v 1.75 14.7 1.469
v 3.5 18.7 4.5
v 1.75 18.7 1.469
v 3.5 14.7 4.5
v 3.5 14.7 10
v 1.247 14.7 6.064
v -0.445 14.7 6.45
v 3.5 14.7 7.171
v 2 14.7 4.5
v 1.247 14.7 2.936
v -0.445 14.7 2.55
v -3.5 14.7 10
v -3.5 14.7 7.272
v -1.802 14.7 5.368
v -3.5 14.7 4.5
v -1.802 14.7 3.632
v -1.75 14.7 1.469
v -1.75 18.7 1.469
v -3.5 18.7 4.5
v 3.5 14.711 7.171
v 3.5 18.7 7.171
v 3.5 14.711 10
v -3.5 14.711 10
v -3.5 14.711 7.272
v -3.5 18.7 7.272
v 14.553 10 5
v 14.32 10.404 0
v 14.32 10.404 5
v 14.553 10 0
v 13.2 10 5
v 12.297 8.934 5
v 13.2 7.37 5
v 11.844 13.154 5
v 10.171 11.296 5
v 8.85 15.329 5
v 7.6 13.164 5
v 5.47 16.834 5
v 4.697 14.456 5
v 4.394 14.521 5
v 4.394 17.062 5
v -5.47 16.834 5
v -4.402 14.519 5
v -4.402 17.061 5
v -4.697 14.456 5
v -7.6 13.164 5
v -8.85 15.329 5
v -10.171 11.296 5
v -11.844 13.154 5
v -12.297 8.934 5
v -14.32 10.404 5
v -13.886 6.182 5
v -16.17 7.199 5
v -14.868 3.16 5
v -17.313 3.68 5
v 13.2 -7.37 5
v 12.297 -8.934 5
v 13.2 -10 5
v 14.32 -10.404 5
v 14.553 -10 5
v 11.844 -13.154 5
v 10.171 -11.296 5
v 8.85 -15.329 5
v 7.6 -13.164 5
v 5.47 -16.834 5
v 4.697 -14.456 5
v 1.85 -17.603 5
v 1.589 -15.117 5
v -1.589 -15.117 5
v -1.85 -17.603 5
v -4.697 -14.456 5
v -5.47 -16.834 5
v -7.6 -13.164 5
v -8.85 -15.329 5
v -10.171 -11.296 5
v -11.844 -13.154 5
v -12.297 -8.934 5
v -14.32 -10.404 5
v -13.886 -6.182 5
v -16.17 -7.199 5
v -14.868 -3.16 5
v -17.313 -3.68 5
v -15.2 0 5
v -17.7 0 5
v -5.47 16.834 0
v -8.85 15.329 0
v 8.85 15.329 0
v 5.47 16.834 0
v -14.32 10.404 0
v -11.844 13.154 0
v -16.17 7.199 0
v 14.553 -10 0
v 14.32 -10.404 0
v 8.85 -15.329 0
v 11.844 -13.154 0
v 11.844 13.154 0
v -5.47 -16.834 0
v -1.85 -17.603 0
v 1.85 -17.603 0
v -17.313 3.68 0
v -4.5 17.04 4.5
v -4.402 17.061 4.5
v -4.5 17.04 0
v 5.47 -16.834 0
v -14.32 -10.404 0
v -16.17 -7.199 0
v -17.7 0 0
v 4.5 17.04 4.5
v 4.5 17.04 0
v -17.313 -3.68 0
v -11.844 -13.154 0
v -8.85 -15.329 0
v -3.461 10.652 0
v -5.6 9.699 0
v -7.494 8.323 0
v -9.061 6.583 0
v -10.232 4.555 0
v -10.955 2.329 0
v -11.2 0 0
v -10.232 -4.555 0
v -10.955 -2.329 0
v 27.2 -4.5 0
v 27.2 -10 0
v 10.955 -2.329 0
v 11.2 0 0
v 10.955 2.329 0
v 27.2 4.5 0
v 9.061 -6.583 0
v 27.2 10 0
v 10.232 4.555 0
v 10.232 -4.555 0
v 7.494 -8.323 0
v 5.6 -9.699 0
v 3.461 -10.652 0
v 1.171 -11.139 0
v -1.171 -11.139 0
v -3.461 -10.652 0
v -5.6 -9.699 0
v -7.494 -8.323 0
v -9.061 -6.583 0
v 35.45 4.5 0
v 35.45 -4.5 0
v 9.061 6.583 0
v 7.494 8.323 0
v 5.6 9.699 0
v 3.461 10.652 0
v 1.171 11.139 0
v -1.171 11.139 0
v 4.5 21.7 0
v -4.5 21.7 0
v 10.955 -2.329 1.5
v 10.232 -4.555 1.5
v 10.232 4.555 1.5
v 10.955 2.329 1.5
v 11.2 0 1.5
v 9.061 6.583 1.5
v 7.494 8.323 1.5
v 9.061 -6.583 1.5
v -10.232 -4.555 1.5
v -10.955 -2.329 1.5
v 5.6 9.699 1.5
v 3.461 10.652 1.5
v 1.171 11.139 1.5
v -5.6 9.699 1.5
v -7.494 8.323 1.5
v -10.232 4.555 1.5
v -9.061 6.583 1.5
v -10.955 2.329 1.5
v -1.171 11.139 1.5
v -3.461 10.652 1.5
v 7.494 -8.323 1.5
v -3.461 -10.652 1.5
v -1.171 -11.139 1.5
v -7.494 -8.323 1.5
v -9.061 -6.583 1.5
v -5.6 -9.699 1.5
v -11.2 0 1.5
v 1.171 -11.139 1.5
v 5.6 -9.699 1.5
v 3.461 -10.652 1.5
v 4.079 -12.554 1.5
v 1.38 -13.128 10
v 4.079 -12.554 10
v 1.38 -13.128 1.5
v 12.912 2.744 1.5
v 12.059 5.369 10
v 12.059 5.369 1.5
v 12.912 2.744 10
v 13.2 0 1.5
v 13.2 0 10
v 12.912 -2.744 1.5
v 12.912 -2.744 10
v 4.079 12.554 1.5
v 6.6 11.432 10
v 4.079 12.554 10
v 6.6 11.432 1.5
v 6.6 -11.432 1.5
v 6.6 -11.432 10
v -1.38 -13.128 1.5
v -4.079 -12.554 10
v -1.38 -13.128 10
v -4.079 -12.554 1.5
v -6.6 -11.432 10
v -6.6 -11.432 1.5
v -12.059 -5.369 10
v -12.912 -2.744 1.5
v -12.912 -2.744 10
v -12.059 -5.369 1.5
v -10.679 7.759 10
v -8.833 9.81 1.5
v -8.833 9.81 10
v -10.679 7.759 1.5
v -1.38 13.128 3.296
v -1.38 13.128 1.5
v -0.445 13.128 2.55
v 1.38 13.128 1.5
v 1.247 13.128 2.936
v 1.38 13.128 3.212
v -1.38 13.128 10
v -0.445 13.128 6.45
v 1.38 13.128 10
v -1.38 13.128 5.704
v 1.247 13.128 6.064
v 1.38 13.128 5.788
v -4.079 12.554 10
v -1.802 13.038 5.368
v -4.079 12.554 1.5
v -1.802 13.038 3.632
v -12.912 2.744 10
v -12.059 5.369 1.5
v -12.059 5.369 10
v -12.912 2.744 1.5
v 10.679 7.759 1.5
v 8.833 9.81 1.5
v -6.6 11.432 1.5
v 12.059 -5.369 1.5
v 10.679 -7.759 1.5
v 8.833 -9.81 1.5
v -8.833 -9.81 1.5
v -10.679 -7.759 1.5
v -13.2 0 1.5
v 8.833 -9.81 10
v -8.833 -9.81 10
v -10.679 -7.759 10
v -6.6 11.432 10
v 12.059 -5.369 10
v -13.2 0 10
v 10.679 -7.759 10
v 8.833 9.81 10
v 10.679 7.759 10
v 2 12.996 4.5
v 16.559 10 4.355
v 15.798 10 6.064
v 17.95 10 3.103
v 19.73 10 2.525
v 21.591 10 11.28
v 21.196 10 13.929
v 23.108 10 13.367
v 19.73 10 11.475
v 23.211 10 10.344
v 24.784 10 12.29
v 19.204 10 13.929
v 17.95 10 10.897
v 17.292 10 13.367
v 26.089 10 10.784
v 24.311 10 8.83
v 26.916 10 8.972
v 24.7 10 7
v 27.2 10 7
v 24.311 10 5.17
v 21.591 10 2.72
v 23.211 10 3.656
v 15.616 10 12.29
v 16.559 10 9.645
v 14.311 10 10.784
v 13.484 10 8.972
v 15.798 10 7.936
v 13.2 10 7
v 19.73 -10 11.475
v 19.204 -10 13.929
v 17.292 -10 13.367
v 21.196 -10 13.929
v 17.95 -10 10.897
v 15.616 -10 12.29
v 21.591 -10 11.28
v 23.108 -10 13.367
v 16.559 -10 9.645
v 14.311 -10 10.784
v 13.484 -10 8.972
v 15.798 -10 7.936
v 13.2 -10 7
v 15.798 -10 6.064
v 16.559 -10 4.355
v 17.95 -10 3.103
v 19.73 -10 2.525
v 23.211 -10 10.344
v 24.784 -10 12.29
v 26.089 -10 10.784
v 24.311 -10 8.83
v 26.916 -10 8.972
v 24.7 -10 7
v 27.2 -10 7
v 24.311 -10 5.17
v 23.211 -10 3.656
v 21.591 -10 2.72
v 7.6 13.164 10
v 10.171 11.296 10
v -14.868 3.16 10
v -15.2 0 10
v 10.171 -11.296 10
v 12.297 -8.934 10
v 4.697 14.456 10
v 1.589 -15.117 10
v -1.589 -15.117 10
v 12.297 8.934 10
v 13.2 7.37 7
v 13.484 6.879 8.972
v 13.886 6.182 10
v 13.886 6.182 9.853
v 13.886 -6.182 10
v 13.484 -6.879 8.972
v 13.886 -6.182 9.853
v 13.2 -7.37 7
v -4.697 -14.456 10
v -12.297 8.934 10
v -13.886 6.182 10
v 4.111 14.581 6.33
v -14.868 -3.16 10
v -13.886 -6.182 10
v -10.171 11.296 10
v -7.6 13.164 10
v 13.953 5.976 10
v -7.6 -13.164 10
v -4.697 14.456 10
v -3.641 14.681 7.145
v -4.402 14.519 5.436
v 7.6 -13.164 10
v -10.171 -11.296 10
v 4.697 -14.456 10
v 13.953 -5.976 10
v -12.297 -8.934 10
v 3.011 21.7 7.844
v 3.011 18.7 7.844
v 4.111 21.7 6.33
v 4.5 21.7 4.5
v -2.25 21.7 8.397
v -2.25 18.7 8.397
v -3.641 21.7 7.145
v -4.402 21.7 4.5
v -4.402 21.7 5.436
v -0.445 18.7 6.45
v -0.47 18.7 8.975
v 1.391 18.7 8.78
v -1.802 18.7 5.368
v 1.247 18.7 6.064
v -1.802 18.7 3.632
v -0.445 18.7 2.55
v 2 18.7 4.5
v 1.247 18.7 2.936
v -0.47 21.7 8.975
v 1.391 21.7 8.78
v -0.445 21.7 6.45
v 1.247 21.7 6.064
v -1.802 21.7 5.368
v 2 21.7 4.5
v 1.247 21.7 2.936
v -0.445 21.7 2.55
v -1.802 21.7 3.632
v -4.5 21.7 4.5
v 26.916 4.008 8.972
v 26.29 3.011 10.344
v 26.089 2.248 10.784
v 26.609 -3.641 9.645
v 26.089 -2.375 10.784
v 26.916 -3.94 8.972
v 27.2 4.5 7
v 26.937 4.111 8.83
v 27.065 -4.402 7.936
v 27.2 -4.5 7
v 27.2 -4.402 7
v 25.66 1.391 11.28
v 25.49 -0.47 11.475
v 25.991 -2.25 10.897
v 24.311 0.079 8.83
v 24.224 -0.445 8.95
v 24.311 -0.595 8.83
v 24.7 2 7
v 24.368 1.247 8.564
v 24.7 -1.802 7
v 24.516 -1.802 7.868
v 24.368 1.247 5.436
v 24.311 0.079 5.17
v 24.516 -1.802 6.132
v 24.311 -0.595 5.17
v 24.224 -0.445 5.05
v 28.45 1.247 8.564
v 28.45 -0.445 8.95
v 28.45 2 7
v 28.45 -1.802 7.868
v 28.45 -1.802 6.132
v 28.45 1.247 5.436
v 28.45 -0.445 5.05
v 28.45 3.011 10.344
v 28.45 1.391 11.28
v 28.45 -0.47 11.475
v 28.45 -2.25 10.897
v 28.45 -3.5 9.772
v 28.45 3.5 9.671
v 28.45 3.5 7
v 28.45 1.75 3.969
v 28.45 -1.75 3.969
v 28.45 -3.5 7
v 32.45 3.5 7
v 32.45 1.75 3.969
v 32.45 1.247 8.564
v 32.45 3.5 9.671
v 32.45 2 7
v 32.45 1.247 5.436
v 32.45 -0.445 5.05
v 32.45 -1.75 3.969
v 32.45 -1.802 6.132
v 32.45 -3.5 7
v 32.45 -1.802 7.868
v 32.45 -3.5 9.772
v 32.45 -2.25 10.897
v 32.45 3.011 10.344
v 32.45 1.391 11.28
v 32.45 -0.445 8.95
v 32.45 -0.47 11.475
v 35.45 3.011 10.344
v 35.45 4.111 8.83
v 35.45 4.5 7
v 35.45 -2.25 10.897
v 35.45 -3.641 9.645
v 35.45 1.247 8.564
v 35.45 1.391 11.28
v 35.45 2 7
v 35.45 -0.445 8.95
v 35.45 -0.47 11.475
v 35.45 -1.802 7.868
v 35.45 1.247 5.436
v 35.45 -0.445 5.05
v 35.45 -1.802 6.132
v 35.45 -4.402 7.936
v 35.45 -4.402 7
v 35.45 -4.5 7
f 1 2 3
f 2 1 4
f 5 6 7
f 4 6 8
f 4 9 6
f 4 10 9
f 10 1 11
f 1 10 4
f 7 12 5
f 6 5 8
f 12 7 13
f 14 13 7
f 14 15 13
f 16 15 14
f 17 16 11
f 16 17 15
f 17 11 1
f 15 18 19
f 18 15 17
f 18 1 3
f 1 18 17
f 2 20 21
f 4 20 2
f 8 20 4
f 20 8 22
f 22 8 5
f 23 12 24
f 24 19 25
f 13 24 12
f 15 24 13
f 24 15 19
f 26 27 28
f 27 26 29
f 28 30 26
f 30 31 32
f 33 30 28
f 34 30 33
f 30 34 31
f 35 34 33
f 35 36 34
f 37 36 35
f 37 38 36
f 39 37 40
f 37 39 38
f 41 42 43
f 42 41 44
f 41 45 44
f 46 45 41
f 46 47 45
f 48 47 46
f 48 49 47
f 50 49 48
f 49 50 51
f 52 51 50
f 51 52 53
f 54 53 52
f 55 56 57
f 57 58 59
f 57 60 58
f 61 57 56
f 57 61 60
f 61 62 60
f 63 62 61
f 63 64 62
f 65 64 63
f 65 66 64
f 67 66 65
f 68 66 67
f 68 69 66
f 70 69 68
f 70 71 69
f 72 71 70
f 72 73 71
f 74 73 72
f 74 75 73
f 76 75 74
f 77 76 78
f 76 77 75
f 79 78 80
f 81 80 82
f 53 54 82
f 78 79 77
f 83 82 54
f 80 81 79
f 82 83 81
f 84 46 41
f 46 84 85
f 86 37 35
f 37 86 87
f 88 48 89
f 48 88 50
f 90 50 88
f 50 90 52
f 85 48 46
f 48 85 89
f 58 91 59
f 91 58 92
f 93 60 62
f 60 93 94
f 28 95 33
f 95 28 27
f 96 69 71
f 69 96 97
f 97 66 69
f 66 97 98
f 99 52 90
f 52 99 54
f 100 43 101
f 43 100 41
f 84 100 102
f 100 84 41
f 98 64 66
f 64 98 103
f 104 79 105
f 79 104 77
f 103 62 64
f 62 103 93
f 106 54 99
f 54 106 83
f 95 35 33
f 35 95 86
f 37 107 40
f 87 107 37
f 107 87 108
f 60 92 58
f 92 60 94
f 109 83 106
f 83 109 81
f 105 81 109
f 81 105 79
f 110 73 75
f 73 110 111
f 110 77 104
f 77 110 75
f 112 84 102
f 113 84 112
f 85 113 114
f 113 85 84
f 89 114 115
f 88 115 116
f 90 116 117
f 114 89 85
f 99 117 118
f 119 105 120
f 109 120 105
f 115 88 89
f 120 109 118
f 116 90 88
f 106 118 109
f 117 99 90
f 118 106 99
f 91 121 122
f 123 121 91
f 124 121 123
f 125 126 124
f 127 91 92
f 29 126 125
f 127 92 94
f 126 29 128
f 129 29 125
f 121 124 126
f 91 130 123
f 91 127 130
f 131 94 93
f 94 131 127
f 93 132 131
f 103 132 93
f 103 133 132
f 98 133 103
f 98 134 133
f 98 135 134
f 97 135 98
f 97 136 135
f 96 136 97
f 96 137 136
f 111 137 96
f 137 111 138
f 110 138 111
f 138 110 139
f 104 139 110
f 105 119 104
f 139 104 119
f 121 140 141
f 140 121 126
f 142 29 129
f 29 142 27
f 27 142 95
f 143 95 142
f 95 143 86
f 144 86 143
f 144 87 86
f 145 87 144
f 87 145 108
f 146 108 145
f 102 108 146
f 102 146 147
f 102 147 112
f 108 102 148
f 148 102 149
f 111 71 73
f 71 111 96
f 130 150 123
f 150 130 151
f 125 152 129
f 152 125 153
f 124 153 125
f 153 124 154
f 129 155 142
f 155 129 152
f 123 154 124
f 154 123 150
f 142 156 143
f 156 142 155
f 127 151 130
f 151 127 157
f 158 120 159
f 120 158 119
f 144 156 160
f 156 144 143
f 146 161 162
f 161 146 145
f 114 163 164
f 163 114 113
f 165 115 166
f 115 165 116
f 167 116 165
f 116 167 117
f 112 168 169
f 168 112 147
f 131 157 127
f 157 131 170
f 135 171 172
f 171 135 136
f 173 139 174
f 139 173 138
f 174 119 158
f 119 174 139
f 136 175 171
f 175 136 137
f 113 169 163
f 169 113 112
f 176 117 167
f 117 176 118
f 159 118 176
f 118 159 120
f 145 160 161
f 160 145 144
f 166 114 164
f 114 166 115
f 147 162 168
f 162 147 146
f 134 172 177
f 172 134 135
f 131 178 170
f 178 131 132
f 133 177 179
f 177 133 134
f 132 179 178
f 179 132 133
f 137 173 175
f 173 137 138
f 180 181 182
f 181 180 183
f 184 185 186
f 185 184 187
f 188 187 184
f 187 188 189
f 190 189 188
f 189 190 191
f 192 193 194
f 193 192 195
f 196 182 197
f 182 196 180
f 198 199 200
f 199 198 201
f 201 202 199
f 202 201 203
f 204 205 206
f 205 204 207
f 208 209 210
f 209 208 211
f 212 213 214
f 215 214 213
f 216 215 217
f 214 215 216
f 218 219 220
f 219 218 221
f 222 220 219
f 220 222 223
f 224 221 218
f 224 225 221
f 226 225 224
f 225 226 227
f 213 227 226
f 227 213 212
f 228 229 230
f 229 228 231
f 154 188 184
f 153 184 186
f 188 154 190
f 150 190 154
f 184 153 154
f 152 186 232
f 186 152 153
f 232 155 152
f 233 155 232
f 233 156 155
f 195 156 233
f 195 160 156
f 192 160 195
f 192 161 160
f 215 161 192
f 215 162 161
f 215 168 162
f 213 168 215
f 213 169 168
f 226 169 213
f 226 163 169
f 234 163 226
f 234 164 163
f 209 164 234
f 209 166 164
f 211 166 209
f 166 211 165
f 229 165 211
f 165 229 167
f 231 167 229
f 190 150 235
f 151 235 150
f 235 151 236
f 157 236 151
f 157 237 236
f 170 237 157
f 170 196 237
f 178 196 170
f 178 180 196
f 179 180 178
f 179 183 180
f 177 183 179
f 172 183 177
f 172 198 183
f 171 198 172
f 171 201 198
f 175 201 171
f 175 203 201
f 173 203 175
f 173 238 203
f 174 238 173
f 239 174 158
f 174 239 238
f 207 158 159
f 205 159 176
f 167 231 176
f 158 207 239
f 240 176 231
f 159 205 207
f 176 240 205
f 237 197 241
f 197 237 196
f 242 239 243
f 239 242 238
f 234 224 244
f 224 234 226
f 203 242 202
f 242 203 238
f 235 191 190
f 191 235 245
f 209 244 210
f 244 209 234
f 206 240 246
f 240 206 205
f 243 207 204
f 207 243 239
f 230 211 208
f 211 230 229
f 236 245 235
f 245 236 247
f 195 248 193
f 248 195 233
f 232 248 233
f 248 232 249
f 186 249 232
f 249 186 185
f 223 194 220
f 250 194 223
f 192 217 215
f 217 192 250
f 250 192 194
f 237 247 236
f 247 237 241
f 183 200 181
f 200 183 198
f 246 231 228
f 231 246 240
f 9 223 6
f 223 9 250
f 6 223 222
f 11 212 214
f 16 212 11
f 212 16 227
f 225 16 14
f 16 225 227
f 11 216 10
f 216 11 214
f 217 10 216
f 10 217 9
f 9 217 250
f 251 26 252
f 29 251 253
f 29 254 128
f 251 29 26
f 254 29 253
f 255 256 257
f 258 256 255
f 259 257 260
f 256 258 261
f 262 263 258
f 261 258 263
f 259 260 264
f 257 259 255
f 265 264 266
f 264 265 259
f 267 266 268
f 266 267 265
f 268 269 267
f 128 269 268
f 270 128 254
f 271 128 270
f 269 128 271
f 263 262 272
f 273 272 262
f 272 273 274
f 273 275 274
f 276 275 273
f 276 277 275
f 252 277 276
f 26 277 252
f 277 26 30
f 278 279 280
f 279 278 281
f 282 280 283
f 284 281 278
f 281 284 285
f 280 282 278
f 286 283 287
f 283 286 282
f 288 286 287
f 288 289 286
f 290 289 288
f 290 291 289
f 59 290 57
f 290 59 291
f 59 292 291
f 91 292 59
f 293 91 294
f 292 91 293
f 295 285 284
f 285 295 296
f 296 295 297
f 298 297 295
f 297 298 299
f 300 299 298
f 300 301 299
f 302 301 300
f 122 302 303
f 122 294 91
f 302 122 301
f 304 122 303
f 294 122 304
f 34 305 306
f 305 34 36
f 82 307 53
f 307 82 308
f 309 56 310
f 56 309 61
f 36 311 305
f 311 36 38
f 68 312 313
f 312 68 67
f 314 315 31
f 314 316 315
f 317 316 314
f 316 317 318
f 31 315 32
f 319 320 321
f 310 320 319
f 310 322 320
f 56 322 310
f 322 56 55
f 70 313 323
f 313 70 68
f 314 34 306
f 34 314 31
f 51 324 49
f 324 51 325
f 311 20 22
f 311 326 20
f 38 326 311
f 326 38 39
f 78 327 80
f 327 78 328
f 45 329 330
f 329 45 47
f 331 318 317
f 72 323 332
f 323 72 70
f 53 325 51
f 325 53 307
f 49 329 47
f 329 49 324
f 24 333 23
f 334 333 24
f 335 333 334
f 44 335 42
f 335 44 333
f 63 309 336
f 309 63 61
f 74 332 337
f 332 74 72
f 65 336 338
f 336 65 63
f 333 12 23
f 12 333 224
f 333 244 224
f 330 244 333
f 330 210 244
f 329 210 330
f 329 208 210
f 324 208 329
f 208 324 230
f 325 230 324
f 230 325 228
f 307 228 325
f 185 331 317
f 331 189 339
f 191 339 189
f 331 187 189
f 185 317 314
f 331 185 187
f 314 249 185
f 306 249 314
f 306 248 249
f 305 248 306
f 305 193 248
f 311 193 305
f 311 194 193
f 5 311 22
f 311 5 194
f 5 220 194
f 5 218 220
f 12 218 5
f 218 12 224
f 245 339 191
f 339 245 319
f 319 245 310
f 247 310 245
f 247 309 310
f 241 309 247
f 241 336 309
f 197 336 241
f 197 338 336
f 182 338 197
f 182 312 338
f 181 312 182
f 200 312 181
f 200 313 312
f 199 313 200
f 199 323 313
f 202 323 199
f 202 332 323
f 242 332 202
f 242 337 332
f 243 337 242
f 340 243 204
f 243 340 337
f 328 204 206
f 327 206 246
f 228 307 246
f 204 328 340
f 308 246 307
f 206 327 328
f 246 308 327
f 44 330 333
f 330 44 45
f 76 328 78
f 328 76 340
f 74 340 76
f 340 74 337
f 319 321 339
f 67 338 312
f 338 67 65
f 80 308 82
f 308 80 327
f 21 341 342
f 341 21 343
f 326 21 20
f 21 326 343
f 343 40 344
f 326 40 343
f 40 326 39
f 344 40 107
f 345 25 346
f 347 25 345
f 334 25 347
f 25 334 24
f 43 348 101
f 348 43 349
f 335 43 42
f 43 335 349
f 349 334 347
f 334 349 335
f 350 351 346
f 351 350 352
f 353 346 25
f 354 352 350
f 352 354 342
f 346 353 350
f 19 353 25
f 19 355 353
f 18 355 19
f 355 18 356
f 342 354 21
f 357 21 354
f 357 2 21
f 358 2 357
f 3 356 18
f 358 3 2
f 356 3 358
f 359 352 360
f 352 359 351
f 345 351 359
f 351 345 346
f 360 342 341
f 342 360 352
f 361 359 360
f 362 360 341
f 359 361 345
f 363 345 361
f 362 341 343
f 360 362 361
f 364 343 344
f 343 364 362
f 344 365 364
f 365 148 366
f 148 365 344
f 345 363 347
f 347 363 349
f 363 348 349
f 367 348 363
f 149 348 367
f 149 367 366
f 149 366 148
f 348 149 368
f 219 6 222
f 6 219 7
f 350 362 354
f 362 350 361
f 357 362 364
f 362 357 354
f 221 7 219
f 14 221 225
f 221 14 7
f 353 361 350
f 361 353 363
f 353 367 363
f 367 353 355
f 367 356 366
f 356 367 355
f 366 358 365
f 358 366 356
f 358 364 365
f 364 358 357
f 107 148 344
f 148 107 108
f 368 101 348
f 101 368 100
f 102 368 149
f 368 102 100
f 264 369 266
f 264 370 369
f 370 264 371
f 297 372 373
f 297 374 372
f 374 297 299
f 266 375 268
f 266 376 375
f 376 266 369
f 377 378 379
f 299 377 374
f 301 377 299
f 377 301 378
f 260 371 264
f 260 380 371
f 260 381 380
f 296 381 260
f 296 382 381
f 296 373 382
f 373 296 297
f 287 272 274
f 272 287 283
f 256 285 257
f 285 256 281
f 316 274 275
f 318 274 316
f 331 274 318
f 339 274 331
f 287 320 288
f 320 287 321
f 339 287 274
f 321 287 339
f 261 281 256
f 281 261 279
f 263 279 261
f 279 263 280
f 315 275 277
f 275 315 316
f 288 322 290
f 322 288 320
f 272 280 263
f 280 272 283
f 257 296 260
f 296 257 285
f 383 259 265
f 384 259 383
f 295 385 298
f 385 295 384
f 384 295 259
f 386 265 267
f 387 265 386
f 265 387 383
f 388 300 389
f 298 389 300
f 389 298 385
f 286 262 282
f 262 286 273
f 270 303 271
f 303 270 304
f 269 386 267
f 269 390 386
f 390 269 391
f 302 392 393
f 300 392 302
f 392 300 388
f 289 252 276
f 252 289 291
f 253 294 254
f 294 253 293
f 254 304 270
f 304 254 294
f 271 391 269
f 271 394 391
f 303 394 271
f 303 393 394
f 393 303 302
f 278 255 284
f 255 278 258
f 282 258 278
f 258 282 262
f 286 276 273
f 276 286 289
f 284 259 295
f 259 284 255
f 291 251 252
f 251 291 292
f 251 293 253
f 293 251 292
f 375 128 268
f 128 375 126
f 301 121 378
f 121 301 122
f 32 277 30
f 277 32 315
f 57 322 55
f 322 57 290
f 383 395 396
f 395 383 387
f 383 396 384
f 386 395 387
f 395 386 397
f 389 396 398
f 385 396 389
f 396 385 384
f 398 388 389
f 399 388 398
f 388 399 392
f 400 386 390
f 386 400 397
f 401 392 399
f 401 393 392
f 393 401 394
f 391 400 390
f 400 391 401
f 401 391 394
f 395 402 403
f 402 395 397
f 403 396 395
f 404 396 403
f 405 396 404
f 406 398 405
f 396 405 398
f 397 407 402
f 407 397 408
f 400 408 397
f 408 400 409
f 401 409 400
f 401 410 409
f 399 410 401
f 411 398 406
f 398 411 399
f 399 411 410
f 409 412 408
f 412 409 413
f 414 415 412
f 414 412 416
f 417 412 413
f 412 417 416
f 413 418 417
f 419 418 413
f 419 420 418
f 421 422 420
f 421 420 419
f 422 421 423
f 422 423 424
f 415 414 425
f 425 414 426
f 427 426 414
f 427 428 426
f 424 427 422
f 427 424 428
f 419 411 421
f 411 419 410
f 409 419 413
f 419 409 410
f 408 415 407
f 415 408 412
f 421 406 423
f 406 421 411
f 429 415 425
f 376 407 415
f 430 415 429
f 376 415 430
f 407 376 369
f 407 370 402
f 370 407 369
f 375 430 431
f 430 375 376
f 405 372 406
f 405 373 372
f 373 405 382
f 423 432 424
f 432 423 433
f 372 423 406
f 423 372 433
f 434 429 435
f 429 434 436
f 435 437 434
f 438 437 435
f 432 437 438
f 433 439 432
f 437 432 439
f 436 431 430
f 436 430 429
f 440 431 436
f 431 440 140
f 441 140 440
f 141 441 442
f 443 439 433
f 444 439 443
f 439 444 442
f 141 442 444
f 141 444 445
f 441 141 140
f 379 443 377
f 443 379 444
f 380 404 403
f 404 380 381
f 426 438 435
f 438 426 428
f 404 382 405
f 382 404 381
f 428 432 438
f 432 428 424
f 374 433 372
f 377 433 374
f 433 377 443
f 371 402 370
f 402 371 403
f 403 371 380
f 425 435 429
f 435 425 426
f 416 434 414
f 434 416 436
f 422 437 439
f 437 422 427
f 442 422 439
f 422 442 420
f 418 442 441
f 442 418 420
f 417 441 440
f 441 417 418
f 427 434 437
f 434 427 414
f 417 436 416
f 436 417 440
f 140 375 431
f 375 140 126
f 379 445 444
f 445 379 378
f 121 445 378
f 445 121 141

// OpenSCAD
//Customizable Open-source lens holder
// This is a cleaned up version of http://www.thingiverse.com/thing:26752

//CUSTOMIZER VARIABLES
//Defines the Diameter of the Lens 
Lens_Diameter=25.4; //Numeric value 

//Defines the Lens holder Thickness
Lens_Holder_Thickness=10;   //Numeric value 

//Defines the Lens Holder Lip Size
Lens_Holder_Lip_Size=3;     //Numeric value smaller than y

//Defines the Base Diameter
Base_Diameter=25; //Numeric value 

//Defines the Base Height
Base_Height=25;  //Numeric value 

//Defines the Guide Rod Length
Guide_Rod_Length=20; //Numeric value 

//Defines the Guide Rod Diameter
Guide_Rod_Diameter=8; //[2:12]

//Defines the Set Screw Diameter
Set_Screw_Diameter=3; //[2:10]

//Defines the Set Screw Nut Diameter
Set_Screw_Nut_Diameter=6; //[4:20]

//Defines the Set Screw Nut Thickness
Set_Screw_Nut_Thickness=3; //[2:10]





//CUSTOMIZER VARIABLES END


// ignore variable values
//Defines the Diameter of the Lens 
x=Lens_Diameter; //Numeric value 

//Defines the Lens holder Thickness
y=Lens_Holder_Thickness;   //Numeric value 

//Defines the Lens Holder Lip Size
z=Lens_Holder_Lip_Size;     //Numeric value smaller than y

//Defines the Base Diameter
X=Base_Diameter; //Numeric value 

//Defines the Base Height
Y=Base_Height;  //Numeric value 

//Defines the Guide Rod Length
e=Guide_Rod_Length; //Numeric value 

//Defines the Guide Rod Diameter
d=Guide_Rod_Diameter; //[2:12]

//Defines the Set Screw Diameter
a=Set_Screw_Diameter; //[2:10]

//Defines the Set Screw Nut Diameter
b=Set_Screw_Nut_Diameter; //[4:20]

//Defines the Set Screw Nut Thickness
c=Set_Screw_Nut_Thickness; //[2:10]


lens_holder();

module lens_holder(){
difference(){
cylinder(y/2,(x+10)/2,(x+10)/2);
cylinder((y+2)/2,(x-3)/2,(x-3)/2);
translate([0,0,1.5])cylinder((y+2)/2,(x+1)/2,(x+1)/2);
translate([0,(x+10)/2+5,(b+3)/2])rotate([90,0,0])cylinder(10,(a+1)/2,(a+1)/2);
translate([0,(x+8)/2,(b+3)/2])nuttrap();
translate([(x+15)/2,e/2,(d+6)/2])rotate([90,0,0])cylinder(e,(d+6)/2, (d+6)/2);
}
difference(){
translate([0,0,y/2])cylinder((y)/2,(x+5)/2,(x+5)/2);
cylinder((y)*2,(x+1)/2,(x+1)/2);
translate([0,(x+10)/2+5,(b+3)/2])rotate([90,0,0])cylinder(25,(b+3)/2,(b+3)/2);
translate([0,(x+8)/2,(b+3)/2])nuttrap();
}
difference(){
translate([0,(x+8)/2,0])set_screw((b+3)/2);
cylinder((y+2),(x+1)/2,(x+1)/2);
}
difference(){
translate([(x+15)/2,0,0])guide_rod();
rotate([0,0,90]){
#translate([0,((x+7)/-2)-((d)),(d+6)/2])rotate([90,0,0])cylinder(50,(a+1)/2,(a+1)/2);
translate([((x+7.5)/2)+((d+6)),0,0])rotate([0,0,90])set_screw1((d+6)/2);
}
}
translate([((x+7.5)/2)+((d+6)),0,0])rotate([0,0,90])set_screw((d+6)/2);
}

module guide_rod(){
difference(){
translate([0,e/2,(d+6)/2])rotate([90,0,0])cylinder(e,(d+6)/2, (d+6)/2);
translate([0,(e/2)+1,(d+6)/2])rotate([90,0,0])cylinder(e+2,(d+1)/2, (d+1)/2);
}
difference(){
translate([0,0,(d+6)/4])cube([(d+6),e,(d+6)/2], center = true);
translate([0,(e/2)+1,(d+6)/2])rotate([90,0,0])cylinder(e+2,(d+1)/2, (d+1)/2);
}
}

module set_screw(h){
difference(){
translate([0,5,h])rotate([90,0,0])cylinder(10,(b+3)/2, (b+3)/2);
#translate([0,10,h])rotate([90,0,0])cylinder(200,(a+1)/2, (a+1)/2);
translate([0,0,h])nuttrap();
}
difference(){
translate([0,0,h/2])cube([(b+3),10,h], center = true);
translate([0,6,h])rotate([90,0,0])cylinder(12,(a+1)/2, (a+1)/2);
translate([0,0,h])nuttrap();
}
}
module set_screw1(h){
translate([0,5,h])rotate([90,0,0])cylinder(10,(b+3)/2, (b+3)/2);
translate([0,0,h/2])cube([(b+3),10,h], center = true);

}

module nuttrap(){
translate([0,(c+1)/2,0])rotate([90,0,0])hexagon(c+1,(b+1)/2);
translate([0,0,(b*3)/2])cube([b+1,c+1,b*3],center = true);
}

module reg_polygon(sides,radius)
{
  function dia(r) = sqrt(pow(r*2,2)/2);  //sqrt((r*2^2)/2) if only we had an exponention op
  if(sides<2) square([radius,0]);
  if(sides==3) triangle(radius);
  if(sides==4) square([dia(radius),dia(radius)],center=true);
  if(sides>4) circle(r=radius,$fn=sides);
}

module hexagonf(radius)
{
  reg_polygon(6,radius);
}

module hexagon(height,radius) 
{
  linear_extrude(height=height) hexagonf(radius);
}
